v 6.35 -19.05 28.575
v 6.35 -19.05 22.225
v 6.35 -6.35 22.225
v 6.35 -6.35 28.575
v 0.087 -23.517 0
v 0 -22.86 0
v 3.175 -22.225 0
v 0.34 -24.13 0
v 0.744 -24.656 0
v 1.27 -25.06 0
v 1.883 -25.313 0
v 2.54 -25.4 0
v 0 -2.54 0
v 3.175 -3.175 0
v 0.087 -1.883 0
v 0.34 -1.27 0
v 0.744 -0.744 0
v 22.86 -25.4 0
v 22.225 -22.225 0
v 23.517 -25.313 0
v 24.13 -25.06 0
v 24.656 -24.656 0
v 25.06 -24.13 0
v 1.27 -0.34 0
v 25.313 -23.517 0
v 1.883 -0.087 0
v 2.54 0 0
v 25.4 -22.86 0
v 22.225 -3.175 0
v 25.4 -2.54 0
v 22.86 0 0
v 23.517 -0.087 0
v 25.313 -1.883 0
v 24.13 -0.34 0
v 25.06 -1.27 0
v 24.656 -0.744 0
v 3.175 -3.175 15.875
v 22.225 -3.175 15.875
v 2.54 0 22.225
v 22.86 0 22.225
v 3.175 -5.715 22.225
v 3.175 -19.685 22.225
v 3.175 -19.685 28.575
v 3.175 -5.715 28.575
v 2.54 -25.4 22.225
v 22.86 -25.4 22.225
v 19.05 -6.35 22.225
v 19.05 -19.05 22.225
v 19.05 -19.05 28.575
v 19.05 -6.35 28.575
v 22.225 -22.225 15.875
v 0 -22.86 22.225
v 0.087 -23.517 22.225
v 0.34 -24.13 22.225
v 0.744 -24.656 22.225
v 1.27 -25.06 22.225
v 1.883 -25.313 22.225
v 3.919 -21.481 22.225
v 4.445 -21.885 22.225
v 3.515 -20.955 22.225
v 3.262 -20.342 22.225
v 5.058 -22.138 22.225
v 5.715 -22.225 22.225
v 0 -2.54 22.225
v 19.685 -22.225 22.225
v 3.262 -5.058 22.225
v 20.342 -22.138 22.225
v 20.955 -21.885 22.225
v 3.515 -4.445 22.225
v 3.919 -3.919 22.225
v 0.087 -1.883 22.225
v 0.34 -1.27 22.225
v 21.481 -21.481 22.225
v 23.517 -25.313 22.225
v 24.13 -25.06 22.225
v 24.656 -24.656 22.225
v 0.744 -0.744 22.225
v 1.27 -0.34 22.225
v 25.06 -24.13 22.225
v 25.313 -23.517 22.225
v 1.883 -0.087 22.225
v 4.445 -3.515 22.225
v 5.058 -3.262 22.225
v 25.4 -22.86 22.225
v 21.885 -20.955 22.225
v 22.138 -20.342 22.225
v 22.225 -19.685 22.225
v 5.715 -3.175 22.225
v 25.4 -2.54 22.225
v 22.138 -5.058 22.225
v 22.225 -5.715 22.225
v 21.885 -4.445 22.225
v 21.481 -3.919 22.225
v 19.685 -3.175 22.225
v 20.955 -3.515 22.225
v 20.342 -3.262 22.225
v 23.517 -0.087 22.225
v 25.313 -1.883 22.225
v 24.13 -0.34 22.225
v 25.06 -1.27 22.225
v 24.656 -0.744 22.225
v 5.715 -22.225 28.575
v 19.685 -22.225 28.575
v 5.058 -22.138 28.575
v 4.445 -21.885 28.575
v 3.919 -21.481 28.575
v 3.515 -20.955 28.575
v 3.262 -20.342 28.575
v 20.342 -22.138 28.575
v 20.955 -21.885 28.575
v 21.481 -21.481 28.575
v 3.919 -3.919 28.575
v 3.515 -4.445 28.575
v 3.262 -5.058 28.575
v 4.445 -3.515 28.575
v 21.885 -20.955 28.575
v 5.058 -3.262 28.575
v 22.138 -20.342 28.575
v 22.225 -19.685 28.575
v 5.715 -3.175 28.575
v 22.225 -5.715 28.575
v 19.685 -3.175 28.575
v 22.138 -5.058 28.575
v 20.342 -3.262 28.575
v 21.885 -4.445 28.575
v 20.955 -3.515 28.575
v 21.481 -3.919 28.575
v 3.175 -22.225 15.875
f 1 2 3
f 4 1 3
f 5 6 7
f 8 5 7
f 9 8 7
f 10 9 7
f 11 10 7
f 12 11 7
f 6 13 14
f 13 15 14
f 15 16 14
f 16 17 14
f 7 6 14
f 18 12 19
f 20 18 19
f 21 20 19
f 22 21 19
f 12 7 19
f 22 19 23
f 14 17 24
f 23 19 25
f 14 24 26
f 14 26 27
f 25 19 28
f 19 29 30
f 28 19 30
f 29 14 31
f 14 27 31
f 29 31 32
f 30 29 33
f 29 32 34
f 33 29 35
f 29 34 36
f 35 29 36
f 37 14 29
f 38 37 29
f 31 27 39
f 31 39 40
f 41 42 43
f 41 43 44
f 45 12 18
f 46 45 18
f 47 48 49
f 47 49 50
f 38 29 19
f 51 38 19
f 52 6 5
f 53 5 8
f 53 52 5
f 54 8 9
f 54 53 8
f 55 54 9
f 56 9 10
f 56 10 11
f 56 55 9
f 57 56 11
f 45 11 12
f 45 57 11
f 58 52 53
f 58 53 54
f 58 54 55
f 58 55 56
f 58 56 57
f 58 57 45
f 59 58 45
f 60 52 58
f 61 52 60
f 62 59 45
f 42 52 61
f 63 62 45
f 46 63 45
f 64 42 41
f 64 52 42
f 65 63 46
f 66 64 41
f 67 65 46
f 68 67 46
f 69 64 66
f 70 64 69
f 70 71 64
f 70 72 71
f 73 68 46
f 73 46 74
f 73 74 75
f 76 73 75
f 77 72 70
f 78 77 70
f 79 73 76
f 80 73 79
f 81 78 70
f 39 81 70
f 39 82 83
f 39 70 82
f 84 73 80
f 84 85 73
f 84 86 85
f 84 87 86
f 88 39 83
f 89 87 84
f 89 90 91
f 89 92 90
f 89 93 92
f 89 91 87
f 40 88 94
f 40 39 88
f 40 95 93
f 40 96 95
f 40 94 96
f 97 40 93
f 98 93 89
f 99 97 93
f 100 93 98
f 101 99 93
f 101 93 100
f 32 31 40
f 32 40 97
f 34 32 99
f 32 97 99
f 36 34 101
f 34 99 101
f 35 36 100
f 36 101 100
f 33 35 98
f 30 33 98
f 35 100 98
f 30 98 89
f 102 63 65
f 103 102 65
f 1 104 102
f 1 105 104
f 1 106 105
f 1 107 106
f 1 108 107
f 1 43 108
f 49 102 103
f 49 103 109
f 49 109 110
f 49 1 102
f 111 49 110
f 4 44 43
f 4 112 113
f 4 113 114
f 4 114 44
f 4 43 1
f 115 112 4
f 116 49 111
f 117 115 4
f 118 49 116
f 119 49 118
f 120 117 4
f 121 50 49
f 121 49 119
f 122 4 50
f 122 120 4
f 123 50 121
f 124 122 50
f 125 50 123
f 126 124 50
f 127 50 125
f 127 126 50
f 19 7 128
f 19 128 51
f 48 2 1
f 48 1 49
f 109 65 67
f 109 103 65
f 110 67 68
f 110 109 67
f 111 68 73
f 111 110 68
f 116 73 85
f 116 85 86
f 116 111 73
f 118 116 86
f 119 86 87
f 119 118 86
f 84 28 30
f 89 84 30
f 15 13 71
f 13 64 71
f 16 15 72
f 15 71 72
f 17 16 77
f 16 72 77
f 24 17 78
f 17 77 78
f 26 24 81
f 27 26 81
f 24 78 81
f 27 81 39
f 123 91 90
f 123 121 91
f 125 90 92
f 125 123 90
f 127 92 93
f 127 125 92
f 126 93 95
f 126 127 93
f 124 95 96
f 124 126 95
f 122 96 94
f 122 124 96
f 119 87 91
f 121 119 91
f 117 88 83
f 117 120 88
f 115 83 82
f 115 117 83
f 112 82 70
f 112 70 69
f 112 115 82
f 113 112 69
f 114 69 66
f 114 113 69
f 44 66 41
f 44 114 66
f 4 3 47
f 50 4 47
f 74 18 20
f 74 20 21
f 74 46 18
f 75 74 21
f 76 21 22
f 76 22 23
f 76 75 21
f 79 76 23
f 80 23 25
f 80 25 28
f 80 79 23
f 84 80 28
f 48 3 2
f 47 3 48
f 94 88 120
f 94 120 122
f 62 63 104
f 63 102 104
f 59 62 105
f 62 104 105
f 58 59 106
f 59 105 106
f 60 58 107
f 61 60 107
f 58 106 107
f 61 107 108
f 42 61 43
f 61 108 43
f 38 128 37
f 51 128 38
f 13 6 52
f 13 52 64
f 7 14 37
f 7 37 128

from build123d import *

# Parameters (mm, degrees)
F0_W     = 25.4
F0_H     = 25.4
F1_DEPTH = 22.225
F2_W     = 19.05
F2_H     = 19.05
F3_DEPTH = 15.875
F4_W     = 19.05
F4_H     = 19.05
F4_W_2   = 12.7
F4_H_2   = 12.7
F5_DEPTH = 6.35
F6_R     = 2.54


with BuildPart() as f1:
    # F0 (on Top) → F1 (new body)
    with BuildSketch(Plane.XY):
        with Locations((12.7, -12.7)):
            Rectangle(F0_W, F0_H)
    extrude(amount=F1_DEPTH)

    # F2 (on face) → F3 (cut)
    with BuildSketch(Plane(origin=(0, 0, 0), x_dir=(1, 0, 0), z_dir=(0, 0, -1))):
        with Locations((12.7, 12.7)):
            Rectangle(F2_W, F2_H)
    extrude(amount=-F3_DEPTH, mode=Mode.SUBTRACT)

    # F4 (on face) → F5 (join)
    with BuildSketch(Plane.XY.offset(22.225)):
        with Locations((12.7, -12.7)):
            Rectangle(F4_W, F4_H)
        with Locations((12.7, -12.7)):
            Rectangle(F4_W_2, F4_H_2, mode=Mode.SUBTRACT)
    extrude(amount=F5_DEPTH)

    # F6
    f6_edges = [f1.edges().sort_by_distance(p)[0] for p in [
        (0, 0, 11.1125),
        (0, -25.4, 11.1125),
        (25.4, 0, 11.1125),
        (3.175, -3.175, 25.4),
        (3.175, -22.225, 25.4),
        (22.225, -3.175, 25.4),
        (22.225, -22.225, 25.4),
        (25.4, -25.4, 11.1125),
    ]]
    fillet(f6_edges, radius=F6_R)


solid = f1.part
